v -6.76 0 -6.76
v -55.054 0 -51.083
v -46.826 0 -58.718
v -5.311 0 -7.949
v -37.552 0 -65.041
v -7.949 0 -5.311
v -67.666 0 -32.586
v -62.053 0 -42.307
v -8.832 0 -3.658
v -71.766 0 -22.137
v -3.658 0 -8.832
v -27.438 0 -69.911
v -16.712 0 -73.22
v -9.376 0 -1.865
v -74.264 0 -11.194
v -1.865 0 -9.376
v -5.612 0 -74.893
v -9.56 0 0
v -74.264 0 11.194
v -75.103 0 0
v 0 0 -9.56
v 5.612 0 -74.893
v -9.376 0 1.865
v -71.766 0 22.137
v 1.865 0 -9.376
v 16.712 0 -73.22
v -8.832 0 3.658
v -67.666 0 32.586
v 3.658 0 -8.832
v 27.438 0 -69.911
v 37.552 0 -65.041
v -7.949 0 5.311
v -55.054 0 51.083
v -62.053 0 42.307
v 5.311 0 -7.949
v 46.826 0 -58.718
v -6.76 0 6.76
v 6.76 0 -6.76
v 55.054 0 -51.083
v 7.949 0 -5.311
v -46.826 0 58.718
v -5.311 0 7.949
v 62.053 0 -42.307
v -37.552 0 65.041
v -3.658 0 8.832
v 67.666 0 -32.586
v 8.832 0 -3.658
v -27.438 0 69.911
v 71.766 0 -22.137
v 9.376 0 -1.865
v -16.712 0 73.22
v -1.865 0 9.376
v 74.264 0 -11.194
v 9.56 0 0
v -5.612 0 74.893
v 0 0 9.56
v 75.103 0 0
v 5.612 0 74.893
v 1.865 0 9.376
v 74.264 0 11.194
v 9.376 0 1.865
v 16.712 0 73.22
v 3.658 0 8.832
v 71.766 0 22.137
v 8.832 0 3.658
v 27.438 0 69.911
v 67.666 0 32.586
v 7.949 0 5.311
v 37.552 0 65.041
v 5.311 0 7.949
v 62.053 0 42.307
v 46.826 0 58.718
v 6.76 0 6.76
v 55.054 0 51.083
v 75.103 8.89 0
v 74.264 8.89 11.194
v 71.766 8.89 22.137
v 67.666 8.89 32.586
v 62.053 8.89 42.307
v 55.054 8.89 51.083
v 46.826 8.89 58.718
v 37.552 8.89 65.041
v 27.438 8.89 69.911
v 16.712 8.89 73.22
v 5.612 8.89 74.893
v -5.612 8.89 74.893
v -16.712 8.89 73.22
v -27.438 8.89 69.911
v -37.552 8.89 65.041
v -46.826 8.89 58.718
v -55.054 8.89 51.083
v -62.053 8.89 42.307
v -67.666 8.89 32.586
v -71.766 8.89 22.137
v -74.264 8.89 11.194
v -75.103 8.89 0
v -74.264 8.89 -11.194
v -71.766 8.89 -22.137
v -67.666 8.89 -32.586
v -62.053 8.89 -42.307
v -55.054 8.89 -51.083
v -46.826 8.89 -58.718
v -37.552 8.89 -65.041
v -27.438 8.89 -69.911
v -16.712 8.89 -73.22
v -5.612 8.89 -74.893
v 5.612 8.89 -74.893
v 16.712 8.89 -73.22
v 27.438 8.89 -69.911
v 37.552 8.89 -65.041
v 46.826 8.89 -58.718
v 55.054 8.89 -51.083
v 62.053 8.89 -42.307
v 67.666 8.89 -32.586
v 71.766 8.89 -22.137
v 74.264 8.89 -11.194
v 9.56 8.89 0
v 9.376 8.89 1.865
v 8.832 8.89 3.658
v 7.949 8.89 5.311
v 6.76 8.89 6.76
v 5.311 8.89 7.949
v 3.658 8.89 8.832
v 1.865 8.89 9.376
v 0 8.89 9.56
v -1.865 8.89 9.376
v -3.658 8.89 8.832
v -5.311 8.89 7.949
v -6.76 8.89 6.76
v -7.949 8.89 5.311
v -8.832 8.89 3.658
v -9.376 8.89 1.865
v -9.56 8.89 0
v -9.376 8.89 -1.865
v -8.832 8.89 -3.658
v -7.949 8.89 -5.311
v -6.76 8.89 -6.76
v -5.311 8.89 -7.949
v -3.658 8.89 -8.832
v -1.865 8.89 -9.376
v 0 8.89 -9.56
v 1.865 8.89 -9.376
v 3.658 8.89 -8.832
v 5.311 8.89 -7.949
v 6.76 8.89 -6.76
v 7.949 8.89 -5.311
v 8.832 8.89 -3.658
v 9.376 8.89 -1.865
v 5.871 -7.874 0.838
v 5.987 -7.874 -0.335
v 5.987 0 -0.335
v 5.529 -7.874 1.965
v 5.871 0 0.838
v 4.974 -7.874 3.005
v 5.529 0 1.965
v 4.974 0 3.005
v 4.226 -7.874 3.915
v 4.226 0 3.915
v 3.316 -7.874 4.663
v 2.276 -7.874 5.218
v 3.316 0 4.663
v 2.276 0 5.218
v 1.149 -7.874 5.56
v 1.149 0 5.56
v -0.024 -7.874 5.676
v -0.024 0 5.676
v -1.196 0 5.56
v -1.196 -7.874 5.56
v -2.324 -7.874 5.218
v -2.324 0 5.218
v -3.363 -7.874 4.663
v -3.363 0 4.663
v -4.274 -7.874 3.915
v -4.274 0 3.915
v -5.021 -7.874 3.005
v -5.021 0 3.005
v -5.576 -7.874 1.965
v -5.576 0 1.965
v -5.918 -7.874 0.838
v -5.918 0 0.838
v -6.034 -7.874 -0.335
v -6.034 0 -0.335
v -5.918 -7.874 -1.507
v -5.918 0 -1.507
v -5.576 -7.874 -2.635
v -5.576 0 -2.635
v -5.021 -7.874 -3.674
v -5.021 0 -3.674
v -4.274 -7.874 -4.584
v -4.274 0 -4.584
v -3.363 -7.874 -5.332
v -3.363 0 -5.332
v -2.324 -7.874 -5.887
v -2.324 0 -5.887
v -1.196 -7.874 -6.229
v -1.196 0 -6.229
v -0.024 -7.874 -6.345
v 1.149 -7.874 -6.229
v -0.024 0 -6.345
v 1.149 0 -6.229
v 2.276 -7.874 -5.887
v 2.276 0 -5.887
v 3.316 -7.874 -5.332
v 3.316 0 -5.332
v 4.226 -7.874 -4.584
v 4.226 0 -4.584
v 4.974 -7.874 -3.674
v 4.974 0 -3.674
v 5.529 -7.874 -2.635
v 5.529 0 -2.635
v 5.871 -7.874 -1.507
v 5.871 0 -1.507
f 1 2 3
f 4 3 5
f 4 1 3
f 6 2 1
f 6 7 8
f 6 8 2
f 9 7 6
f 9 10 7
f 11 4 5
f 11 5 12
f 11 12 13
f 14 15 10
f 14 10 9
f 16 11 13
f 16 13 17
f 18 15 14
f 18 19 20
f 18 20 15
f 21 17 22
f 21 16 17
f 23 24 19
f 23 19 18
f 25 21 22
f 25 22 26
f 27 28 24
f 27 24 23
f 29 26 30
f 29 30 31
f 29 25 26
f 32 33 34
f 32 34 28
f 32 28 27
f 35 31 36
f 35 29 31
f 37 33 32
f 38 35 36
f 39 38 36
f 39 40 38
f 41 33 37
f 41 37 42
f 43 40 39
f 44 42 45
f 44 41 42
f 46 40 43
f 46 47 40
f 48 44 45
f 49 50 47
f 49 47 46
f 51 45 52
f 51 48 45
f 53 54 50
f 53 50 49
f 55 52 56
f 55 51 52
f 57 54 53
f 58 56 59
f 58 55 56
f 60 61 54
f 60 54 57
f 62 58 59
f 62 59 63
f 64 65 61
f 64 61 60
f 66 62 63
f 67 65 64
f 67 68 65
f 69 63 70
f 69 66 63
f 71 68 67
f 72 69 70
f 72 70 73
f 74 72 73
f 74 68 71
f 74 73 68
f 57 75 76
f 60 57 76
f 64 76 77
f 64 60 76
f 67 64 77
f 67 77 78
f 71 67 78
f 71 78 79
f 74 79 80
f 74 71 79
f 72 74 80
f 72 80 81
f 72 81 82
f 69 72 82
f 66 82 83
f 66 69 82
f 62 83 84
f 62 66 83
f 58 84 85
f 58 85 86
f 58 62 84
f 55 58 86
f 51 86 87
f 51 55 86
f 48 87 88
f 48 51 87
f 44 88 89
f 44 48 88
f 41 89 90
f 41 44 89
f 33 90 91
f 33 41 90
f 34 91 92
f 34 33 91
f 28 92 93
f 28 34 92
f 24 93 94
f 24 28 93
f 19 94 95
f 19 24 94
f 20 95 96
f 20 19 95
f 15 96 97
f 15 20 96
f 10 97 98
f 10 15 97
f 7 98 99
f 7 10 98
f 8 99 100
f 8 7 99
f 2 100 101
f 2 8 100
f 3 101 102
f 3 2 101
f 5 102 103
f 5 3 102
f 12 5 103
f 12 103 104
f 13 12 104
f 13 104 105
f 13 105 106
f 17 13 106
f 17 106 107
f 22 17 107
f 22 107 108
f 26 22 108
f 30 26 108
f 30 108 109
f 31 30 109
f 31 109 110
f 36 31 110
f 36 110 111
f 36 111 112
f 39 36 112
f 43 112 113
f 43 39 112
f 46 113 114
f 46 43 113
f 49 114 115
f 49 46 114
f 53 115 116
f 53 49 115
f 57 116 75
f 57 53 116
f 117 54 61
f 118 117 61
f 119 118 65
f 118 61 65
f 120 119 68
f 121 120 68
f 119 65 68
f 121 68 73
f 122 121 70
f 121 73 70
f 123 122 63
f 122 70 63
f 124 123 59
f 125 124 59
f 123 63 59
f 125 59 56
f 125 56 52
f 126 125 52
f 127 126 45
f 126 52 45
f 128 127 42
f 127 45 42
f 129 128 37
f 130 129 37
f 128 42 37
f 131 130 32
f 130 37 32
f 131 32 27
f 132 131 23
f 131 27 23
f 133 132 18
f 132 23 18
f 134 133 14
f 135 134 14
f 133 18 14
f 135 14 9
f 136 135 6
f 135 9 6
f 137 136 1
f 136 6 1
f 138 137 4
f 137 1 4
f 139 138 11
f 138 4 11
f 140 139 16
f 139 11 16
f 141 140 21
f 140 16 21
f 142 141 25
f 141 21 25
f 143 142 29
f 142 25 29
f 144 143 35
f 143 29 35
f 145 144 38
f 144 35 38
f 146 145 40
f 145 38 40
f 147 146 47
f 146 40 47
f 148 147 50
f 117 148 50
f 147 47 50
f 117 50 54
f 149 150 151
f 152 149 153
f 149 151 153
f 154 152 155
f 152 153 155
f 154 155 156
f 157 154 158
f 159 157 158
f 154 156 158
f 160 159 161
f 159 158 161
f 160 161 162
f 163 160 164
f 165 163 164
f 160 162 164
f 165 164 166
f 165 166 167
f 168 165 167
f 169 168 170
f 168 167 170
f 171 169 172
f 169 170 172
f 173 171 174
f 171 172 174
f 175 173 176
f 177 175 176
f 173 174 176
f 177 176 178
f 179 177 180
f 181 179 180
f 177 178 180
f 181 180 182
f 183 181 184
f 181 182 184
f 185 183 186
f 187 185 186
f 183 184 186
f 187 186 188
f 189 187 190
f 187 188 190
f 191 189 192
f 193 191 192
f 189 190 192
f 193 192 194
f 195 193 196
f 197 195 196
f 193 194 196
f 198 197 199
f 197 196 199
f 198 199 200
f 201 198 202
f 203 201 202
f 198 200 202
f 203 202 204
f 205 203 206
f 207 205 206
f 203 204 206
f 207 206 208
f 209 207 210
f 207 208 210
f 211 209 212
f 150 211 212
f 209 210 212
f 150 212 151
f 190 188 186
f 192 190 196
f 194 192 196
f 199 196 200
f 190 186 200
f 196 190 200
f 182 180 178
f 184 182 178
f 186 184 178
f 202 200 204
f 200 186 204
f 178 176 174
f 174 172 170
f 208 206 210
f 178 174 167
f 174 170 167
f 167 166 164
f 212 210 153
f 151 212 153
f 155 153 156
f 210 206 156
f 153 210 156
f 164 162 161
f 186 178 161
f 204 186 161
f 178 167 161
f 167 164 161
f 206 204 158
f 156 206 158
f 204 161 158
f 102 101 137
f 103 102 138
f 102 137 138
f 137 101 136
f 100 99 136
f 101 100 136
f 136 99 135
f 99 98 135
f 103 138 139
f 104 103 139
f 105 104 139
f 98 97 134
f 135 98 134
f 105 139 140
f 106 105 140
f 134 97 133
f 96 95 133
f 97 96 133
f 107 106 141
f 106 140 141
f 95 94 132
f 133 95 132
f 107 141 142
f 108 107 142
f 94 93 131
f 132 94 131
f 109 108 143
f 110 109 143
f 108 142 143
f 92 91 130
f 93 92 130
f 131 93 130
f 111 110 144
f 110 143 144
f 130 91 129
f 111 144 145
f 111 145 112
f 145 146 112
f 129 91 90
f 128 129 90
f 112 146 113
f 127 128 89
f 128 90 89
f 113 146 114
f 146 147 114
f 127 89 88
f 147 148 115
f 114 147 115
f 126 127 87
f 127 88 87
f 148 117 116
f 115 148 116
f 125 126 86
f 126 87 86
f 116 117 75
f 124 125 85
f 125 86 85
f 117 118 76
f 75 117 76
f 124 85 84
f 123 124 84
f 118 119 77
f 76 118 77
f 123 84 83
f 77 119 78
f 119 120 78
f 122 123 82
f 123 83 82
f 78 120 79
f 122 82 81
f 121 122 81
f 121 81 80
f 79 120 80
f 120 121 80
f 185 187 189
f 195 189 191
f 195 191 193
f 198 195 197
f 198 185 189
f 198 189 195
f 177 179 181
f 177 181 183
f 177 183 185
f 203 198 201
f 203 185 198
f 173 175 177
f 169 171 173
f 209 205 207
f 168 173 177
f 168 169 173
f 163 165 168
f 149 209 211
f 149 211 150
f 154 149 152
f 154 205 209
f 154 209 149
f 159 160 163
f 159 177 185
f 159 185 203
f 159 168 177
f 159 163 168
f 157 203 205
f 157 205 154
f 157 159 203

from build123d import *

# Parameters (mm, degrees)
F0_R     = 75.10308026
F0_R_2   = 9.559954458
F4_DEPTH = 8.89
F6_R     = 6.0103256088
F7_DEPTH = 7.874


# Not quite as in the source:
# - the program builds the solid bodies; features that only make, move or delete a surface that nothing else refers to are left out


with BuildPart() as f4:
    # F0 (on Front) → F4 (new body)
    with BuildSketch(Plane.XZ):
        Circle(F0_R)
        Circle(F0_R_2, mode=Mode.SUBTRACT)
    extrude(amount=-F4_DEPTH)


with BuildPart() as f7:
    # F6 (on Front) → F7 (new body)
    with BuildSketch(Plane.XZ):
        with Locations((-0.0235913109, -0.3345536048)):
            Circle(F6_R)
    extrude(amount=F7_DEPTH)


solid = Compound([f4.part, f7.part])
